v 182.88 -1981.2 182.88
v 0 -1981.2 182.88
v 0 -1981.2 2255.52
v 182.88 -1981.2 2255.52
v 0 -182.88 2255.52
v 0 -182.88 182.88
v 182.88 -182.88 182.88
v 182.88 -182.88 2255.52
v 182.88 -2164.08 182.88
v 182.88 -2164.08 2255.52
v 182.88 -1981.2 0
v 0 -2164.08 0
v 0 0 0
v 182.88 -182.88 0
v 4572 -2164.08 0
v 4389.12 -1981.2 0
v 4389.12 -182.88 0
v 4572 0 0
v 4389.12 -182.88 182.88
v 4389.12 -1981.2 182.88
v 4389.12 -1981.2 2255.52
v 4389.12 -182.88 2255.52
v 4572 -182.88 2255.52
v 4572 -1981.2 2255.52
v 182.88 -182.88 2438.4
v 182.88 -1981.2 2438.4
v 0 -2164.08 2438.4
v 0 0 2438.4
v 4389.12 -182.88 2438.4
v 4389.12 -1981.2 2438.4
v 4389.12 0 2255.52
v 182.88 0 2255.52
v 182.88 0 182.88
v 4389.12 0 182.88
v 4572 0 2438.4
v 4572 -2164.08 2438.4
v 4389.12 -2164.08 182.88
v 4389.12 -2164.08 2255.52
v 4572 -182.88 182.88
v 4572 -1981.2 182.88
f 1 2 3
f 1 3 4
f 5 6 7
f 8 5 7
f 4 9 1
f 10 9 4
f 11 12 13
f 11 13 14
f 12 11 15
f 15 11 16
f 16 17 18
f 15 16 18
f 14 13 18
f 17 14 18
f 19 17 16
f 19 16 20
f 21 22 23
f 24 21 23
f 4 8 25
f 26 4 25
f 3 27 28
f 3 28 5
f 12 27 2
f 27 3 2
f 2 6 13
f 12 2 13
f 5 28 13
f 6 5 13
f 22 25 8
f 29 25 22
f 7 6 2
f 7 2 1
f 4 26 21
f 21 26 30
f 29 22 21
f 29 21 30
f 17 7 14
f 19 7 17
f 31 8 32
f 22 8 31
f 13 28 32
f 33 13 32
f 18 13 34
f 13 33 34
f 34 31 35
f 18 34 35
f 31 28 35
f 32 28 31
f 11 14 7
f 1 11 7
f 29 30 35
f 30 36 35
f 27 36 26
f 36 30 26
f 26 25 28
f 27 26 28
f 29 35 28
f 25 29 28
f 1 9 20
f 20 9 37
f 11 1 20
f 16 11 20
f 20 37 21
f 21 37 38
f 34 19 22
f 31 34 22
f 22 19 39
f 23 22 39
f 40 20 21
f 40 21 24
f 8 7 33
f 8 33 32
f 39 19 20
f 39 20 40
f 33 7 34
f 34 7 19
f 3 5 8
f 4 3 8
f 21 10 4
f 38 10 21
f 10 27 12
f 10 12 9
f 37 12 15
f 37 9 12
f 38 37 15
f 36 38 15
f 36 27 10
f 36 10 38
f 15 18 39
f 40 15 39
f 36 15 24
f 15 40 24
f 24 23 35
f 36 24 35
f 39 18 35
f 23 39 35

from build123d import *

# Parameters (mm, degrees)
F0_W     = 4572
F0_H     = 2438.4
F1_DEPTH = 182.88
F2_W     = 182.88
F2_H     = 182.88
F3_DEPTH = 1981.2
F4_W     = 182.88
F4_H     = 182.88
F5_DEPTH = 182.88
F6_W     = 4206.24
F6_H     = 2072.64
F7_DEPTH = 2286


with BuildPart() as f1:
    # F0 (on Front) → F1 (new body)
    with BuildSketch(Plane.XZ):
        with Locations((2286, 1219.2)):
            Rectangle(F0_W, F0_H)
    extrude(amount=F1_DEPTH)

    # F2 (on face) → F3 (join)
    with BuildSketch(Plane.XZ):
        with Locations((91.44, 2346.96)):
            Rectangle(F2_W, F2_H)
        with Locations((91.44, 91.44)):
            Rectangle(F2_W, F2_H)
        with Locations((4480.56, 91.44)):
            Rectangle(F2_W, F2_H)
        with Locations((4480.56, 2346.96)):
            Rectangle(F2_W, F2_H)
    extrude(amount=F3_DEPTH)

    # F4 (on face) → F5 (join)
    with BuildSketch(Plane.XZ.offset(1981.2)):
        Polygon((4572, 2438.4), (182.88, 2438.4), (182.88, 2255.52), (0, 2255.52), (0, 0), (4572, 0), align=None)
        with Locations((91.44, 2346.96)):
            Rectangle(F4_W, F4_H)
    extrude(amount=F5_DEPTH)

    # F6 (on face) → F7 (cut)
    with BuildSketch(Plane.XZ.offset(2164.08)):
        with Locations((2286, 1219.2)):
            Rectangle(F6_W, F6_H)
    extrude(amount=-F7_DEPTH, mode=Mode.SUBTRACT)


solid = f1.part
